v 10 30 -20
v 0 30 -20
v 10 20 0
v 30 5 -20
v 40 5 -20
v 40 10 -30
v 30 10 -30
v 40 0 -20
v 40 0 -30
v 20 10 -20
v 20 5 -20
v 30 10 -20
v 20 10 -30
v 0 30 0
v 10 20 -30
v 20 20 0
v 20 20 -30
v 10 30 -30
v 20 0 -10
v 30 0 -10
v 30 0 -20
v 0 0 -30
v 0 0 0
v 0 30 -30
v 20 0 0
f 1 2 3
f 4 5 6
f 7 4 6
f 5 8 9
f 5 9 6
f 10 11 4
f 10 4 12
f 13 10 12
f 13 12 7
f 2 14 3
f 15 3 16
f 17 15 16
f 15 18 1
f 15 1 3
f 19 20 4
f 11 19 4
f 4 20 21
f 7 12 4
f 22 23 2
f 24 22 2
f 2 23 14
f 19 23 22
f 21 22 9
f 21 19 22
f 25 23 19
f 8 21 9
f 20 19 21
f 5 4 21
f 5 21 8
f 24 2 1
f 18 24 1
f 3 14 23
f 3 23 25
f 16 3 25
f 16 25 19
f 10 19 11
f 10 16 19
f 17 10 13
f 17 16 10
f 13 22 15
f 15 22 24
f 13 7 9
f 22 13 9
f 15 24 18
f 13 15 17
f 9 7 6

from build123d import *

# Parameters (mm, degrees)
SKETCH_1_W           = 40
SKETCH_1_H           = 30
EXTRUDE_1_DEPTH      = 30
SKETCH_46_W          = 20
SKETCH_46_H          = 10
CUT_EXTRUDE_32_DEPTH = 59.309518948
CUT_EXTRUDE_33_DEPTH = 59.309518948
CUT_EXTRUDE_34_DEPTH = 20
EXTRUDE_2_DEPTH      = 10
CUT_EXTRUDE_35_DEPTH = 20
SKETCH_54_W          = 10
SKETCH_54_H          = 5
EXTRUDE_3_DEPTH      = 10


with BuildPart() as part:
    # 草圖1 → 填料-伸1 (new body)
    with BuildSketch(Plane.XY):
        with Locations((20, 15)):
            Rectangle(SKETCH_1_W, SKETCH_1_H)
    extrude(amount=-EXTRUDE_1_DEPTH)

    # 草圖46 → 除料-伸長32 (cut, through all)
    with BuildSketch(Plane.XY):
        Polygon((40, 30), (10, 30), (10, 20), (20, 20), (40, 20), align=None)
        with Locations((30, 15)):
            Rectangle(SKETCH_46_W, SKETCH_46_H)
    extrude(amount=-CUT_EXTRUDE_32_DEPTH, mode=Mode.SUBTRACT)

    # 草圖47 → 除料-伸長33 (cut, through all)
    with BuildSketch(Plane(origin=(0, 30, 0), x_dir=(1, 0, 0), z_dir=(0, 1, 0))):
        Polygon((20, 0), (20, 10), (30, 10), (30, 20), (40, 20), (40, 0), align=None)
    extrude(amount=-CUT_EXTRUDE_33_DEPTH, mode=Mode.SUBTRACT)

    # 草圖48 → 除料-伸長34 (cut)
    with BuildSketch(Plane.XY):
        Polygon((0, 30), (10, 20), (10, 30), align=None)
    extrude(amount=-CUT_EXTRUDE_34_DEPTH, mode=Mode.SUBTRACT)

    # 填料-伸長2: read off the stored shape, not the designer's step
    # 填料-伸長2 outline → 填料-伸長2 (add)
    with BuildSketch(Plane.YZ):
        Polygon((20, -30), (30, -30), (30, -20), (20, 0), align=None)
    extrude(amount=EXTRUDE_2_DEPTH)

    # 草圖52 → 除料-伸長35 (cut)
    with BuildSketch(Plane(origin=(40, 0, 0), x_dir=(0, 0, -1), z_dir=(1, 0, 0))):
        Polygon((20, 10), (20, 5), (30, 10), align=None)
        Polygon((10, 10), (10, 0), (20, 5), (20, 10), align=None)
    extrude(amount=-CUT_EXTRUDE_35_DEPTH, mode=Mode.SUBTRACT)

    # 草圖54 → 填料-伸長3 (add)
    with BuildSketch(Plane(origin=(20, 0, 0), x_dir=(0, 0, -1), z_dir=(1, 0, 0))):
        with Locations((25, 7.5)):
            Rectangle(SKETCH_54_W, SKETCH_54_H)
    extrude(amount=EXTRUDE_3_DEPTH)


solid = part.part
